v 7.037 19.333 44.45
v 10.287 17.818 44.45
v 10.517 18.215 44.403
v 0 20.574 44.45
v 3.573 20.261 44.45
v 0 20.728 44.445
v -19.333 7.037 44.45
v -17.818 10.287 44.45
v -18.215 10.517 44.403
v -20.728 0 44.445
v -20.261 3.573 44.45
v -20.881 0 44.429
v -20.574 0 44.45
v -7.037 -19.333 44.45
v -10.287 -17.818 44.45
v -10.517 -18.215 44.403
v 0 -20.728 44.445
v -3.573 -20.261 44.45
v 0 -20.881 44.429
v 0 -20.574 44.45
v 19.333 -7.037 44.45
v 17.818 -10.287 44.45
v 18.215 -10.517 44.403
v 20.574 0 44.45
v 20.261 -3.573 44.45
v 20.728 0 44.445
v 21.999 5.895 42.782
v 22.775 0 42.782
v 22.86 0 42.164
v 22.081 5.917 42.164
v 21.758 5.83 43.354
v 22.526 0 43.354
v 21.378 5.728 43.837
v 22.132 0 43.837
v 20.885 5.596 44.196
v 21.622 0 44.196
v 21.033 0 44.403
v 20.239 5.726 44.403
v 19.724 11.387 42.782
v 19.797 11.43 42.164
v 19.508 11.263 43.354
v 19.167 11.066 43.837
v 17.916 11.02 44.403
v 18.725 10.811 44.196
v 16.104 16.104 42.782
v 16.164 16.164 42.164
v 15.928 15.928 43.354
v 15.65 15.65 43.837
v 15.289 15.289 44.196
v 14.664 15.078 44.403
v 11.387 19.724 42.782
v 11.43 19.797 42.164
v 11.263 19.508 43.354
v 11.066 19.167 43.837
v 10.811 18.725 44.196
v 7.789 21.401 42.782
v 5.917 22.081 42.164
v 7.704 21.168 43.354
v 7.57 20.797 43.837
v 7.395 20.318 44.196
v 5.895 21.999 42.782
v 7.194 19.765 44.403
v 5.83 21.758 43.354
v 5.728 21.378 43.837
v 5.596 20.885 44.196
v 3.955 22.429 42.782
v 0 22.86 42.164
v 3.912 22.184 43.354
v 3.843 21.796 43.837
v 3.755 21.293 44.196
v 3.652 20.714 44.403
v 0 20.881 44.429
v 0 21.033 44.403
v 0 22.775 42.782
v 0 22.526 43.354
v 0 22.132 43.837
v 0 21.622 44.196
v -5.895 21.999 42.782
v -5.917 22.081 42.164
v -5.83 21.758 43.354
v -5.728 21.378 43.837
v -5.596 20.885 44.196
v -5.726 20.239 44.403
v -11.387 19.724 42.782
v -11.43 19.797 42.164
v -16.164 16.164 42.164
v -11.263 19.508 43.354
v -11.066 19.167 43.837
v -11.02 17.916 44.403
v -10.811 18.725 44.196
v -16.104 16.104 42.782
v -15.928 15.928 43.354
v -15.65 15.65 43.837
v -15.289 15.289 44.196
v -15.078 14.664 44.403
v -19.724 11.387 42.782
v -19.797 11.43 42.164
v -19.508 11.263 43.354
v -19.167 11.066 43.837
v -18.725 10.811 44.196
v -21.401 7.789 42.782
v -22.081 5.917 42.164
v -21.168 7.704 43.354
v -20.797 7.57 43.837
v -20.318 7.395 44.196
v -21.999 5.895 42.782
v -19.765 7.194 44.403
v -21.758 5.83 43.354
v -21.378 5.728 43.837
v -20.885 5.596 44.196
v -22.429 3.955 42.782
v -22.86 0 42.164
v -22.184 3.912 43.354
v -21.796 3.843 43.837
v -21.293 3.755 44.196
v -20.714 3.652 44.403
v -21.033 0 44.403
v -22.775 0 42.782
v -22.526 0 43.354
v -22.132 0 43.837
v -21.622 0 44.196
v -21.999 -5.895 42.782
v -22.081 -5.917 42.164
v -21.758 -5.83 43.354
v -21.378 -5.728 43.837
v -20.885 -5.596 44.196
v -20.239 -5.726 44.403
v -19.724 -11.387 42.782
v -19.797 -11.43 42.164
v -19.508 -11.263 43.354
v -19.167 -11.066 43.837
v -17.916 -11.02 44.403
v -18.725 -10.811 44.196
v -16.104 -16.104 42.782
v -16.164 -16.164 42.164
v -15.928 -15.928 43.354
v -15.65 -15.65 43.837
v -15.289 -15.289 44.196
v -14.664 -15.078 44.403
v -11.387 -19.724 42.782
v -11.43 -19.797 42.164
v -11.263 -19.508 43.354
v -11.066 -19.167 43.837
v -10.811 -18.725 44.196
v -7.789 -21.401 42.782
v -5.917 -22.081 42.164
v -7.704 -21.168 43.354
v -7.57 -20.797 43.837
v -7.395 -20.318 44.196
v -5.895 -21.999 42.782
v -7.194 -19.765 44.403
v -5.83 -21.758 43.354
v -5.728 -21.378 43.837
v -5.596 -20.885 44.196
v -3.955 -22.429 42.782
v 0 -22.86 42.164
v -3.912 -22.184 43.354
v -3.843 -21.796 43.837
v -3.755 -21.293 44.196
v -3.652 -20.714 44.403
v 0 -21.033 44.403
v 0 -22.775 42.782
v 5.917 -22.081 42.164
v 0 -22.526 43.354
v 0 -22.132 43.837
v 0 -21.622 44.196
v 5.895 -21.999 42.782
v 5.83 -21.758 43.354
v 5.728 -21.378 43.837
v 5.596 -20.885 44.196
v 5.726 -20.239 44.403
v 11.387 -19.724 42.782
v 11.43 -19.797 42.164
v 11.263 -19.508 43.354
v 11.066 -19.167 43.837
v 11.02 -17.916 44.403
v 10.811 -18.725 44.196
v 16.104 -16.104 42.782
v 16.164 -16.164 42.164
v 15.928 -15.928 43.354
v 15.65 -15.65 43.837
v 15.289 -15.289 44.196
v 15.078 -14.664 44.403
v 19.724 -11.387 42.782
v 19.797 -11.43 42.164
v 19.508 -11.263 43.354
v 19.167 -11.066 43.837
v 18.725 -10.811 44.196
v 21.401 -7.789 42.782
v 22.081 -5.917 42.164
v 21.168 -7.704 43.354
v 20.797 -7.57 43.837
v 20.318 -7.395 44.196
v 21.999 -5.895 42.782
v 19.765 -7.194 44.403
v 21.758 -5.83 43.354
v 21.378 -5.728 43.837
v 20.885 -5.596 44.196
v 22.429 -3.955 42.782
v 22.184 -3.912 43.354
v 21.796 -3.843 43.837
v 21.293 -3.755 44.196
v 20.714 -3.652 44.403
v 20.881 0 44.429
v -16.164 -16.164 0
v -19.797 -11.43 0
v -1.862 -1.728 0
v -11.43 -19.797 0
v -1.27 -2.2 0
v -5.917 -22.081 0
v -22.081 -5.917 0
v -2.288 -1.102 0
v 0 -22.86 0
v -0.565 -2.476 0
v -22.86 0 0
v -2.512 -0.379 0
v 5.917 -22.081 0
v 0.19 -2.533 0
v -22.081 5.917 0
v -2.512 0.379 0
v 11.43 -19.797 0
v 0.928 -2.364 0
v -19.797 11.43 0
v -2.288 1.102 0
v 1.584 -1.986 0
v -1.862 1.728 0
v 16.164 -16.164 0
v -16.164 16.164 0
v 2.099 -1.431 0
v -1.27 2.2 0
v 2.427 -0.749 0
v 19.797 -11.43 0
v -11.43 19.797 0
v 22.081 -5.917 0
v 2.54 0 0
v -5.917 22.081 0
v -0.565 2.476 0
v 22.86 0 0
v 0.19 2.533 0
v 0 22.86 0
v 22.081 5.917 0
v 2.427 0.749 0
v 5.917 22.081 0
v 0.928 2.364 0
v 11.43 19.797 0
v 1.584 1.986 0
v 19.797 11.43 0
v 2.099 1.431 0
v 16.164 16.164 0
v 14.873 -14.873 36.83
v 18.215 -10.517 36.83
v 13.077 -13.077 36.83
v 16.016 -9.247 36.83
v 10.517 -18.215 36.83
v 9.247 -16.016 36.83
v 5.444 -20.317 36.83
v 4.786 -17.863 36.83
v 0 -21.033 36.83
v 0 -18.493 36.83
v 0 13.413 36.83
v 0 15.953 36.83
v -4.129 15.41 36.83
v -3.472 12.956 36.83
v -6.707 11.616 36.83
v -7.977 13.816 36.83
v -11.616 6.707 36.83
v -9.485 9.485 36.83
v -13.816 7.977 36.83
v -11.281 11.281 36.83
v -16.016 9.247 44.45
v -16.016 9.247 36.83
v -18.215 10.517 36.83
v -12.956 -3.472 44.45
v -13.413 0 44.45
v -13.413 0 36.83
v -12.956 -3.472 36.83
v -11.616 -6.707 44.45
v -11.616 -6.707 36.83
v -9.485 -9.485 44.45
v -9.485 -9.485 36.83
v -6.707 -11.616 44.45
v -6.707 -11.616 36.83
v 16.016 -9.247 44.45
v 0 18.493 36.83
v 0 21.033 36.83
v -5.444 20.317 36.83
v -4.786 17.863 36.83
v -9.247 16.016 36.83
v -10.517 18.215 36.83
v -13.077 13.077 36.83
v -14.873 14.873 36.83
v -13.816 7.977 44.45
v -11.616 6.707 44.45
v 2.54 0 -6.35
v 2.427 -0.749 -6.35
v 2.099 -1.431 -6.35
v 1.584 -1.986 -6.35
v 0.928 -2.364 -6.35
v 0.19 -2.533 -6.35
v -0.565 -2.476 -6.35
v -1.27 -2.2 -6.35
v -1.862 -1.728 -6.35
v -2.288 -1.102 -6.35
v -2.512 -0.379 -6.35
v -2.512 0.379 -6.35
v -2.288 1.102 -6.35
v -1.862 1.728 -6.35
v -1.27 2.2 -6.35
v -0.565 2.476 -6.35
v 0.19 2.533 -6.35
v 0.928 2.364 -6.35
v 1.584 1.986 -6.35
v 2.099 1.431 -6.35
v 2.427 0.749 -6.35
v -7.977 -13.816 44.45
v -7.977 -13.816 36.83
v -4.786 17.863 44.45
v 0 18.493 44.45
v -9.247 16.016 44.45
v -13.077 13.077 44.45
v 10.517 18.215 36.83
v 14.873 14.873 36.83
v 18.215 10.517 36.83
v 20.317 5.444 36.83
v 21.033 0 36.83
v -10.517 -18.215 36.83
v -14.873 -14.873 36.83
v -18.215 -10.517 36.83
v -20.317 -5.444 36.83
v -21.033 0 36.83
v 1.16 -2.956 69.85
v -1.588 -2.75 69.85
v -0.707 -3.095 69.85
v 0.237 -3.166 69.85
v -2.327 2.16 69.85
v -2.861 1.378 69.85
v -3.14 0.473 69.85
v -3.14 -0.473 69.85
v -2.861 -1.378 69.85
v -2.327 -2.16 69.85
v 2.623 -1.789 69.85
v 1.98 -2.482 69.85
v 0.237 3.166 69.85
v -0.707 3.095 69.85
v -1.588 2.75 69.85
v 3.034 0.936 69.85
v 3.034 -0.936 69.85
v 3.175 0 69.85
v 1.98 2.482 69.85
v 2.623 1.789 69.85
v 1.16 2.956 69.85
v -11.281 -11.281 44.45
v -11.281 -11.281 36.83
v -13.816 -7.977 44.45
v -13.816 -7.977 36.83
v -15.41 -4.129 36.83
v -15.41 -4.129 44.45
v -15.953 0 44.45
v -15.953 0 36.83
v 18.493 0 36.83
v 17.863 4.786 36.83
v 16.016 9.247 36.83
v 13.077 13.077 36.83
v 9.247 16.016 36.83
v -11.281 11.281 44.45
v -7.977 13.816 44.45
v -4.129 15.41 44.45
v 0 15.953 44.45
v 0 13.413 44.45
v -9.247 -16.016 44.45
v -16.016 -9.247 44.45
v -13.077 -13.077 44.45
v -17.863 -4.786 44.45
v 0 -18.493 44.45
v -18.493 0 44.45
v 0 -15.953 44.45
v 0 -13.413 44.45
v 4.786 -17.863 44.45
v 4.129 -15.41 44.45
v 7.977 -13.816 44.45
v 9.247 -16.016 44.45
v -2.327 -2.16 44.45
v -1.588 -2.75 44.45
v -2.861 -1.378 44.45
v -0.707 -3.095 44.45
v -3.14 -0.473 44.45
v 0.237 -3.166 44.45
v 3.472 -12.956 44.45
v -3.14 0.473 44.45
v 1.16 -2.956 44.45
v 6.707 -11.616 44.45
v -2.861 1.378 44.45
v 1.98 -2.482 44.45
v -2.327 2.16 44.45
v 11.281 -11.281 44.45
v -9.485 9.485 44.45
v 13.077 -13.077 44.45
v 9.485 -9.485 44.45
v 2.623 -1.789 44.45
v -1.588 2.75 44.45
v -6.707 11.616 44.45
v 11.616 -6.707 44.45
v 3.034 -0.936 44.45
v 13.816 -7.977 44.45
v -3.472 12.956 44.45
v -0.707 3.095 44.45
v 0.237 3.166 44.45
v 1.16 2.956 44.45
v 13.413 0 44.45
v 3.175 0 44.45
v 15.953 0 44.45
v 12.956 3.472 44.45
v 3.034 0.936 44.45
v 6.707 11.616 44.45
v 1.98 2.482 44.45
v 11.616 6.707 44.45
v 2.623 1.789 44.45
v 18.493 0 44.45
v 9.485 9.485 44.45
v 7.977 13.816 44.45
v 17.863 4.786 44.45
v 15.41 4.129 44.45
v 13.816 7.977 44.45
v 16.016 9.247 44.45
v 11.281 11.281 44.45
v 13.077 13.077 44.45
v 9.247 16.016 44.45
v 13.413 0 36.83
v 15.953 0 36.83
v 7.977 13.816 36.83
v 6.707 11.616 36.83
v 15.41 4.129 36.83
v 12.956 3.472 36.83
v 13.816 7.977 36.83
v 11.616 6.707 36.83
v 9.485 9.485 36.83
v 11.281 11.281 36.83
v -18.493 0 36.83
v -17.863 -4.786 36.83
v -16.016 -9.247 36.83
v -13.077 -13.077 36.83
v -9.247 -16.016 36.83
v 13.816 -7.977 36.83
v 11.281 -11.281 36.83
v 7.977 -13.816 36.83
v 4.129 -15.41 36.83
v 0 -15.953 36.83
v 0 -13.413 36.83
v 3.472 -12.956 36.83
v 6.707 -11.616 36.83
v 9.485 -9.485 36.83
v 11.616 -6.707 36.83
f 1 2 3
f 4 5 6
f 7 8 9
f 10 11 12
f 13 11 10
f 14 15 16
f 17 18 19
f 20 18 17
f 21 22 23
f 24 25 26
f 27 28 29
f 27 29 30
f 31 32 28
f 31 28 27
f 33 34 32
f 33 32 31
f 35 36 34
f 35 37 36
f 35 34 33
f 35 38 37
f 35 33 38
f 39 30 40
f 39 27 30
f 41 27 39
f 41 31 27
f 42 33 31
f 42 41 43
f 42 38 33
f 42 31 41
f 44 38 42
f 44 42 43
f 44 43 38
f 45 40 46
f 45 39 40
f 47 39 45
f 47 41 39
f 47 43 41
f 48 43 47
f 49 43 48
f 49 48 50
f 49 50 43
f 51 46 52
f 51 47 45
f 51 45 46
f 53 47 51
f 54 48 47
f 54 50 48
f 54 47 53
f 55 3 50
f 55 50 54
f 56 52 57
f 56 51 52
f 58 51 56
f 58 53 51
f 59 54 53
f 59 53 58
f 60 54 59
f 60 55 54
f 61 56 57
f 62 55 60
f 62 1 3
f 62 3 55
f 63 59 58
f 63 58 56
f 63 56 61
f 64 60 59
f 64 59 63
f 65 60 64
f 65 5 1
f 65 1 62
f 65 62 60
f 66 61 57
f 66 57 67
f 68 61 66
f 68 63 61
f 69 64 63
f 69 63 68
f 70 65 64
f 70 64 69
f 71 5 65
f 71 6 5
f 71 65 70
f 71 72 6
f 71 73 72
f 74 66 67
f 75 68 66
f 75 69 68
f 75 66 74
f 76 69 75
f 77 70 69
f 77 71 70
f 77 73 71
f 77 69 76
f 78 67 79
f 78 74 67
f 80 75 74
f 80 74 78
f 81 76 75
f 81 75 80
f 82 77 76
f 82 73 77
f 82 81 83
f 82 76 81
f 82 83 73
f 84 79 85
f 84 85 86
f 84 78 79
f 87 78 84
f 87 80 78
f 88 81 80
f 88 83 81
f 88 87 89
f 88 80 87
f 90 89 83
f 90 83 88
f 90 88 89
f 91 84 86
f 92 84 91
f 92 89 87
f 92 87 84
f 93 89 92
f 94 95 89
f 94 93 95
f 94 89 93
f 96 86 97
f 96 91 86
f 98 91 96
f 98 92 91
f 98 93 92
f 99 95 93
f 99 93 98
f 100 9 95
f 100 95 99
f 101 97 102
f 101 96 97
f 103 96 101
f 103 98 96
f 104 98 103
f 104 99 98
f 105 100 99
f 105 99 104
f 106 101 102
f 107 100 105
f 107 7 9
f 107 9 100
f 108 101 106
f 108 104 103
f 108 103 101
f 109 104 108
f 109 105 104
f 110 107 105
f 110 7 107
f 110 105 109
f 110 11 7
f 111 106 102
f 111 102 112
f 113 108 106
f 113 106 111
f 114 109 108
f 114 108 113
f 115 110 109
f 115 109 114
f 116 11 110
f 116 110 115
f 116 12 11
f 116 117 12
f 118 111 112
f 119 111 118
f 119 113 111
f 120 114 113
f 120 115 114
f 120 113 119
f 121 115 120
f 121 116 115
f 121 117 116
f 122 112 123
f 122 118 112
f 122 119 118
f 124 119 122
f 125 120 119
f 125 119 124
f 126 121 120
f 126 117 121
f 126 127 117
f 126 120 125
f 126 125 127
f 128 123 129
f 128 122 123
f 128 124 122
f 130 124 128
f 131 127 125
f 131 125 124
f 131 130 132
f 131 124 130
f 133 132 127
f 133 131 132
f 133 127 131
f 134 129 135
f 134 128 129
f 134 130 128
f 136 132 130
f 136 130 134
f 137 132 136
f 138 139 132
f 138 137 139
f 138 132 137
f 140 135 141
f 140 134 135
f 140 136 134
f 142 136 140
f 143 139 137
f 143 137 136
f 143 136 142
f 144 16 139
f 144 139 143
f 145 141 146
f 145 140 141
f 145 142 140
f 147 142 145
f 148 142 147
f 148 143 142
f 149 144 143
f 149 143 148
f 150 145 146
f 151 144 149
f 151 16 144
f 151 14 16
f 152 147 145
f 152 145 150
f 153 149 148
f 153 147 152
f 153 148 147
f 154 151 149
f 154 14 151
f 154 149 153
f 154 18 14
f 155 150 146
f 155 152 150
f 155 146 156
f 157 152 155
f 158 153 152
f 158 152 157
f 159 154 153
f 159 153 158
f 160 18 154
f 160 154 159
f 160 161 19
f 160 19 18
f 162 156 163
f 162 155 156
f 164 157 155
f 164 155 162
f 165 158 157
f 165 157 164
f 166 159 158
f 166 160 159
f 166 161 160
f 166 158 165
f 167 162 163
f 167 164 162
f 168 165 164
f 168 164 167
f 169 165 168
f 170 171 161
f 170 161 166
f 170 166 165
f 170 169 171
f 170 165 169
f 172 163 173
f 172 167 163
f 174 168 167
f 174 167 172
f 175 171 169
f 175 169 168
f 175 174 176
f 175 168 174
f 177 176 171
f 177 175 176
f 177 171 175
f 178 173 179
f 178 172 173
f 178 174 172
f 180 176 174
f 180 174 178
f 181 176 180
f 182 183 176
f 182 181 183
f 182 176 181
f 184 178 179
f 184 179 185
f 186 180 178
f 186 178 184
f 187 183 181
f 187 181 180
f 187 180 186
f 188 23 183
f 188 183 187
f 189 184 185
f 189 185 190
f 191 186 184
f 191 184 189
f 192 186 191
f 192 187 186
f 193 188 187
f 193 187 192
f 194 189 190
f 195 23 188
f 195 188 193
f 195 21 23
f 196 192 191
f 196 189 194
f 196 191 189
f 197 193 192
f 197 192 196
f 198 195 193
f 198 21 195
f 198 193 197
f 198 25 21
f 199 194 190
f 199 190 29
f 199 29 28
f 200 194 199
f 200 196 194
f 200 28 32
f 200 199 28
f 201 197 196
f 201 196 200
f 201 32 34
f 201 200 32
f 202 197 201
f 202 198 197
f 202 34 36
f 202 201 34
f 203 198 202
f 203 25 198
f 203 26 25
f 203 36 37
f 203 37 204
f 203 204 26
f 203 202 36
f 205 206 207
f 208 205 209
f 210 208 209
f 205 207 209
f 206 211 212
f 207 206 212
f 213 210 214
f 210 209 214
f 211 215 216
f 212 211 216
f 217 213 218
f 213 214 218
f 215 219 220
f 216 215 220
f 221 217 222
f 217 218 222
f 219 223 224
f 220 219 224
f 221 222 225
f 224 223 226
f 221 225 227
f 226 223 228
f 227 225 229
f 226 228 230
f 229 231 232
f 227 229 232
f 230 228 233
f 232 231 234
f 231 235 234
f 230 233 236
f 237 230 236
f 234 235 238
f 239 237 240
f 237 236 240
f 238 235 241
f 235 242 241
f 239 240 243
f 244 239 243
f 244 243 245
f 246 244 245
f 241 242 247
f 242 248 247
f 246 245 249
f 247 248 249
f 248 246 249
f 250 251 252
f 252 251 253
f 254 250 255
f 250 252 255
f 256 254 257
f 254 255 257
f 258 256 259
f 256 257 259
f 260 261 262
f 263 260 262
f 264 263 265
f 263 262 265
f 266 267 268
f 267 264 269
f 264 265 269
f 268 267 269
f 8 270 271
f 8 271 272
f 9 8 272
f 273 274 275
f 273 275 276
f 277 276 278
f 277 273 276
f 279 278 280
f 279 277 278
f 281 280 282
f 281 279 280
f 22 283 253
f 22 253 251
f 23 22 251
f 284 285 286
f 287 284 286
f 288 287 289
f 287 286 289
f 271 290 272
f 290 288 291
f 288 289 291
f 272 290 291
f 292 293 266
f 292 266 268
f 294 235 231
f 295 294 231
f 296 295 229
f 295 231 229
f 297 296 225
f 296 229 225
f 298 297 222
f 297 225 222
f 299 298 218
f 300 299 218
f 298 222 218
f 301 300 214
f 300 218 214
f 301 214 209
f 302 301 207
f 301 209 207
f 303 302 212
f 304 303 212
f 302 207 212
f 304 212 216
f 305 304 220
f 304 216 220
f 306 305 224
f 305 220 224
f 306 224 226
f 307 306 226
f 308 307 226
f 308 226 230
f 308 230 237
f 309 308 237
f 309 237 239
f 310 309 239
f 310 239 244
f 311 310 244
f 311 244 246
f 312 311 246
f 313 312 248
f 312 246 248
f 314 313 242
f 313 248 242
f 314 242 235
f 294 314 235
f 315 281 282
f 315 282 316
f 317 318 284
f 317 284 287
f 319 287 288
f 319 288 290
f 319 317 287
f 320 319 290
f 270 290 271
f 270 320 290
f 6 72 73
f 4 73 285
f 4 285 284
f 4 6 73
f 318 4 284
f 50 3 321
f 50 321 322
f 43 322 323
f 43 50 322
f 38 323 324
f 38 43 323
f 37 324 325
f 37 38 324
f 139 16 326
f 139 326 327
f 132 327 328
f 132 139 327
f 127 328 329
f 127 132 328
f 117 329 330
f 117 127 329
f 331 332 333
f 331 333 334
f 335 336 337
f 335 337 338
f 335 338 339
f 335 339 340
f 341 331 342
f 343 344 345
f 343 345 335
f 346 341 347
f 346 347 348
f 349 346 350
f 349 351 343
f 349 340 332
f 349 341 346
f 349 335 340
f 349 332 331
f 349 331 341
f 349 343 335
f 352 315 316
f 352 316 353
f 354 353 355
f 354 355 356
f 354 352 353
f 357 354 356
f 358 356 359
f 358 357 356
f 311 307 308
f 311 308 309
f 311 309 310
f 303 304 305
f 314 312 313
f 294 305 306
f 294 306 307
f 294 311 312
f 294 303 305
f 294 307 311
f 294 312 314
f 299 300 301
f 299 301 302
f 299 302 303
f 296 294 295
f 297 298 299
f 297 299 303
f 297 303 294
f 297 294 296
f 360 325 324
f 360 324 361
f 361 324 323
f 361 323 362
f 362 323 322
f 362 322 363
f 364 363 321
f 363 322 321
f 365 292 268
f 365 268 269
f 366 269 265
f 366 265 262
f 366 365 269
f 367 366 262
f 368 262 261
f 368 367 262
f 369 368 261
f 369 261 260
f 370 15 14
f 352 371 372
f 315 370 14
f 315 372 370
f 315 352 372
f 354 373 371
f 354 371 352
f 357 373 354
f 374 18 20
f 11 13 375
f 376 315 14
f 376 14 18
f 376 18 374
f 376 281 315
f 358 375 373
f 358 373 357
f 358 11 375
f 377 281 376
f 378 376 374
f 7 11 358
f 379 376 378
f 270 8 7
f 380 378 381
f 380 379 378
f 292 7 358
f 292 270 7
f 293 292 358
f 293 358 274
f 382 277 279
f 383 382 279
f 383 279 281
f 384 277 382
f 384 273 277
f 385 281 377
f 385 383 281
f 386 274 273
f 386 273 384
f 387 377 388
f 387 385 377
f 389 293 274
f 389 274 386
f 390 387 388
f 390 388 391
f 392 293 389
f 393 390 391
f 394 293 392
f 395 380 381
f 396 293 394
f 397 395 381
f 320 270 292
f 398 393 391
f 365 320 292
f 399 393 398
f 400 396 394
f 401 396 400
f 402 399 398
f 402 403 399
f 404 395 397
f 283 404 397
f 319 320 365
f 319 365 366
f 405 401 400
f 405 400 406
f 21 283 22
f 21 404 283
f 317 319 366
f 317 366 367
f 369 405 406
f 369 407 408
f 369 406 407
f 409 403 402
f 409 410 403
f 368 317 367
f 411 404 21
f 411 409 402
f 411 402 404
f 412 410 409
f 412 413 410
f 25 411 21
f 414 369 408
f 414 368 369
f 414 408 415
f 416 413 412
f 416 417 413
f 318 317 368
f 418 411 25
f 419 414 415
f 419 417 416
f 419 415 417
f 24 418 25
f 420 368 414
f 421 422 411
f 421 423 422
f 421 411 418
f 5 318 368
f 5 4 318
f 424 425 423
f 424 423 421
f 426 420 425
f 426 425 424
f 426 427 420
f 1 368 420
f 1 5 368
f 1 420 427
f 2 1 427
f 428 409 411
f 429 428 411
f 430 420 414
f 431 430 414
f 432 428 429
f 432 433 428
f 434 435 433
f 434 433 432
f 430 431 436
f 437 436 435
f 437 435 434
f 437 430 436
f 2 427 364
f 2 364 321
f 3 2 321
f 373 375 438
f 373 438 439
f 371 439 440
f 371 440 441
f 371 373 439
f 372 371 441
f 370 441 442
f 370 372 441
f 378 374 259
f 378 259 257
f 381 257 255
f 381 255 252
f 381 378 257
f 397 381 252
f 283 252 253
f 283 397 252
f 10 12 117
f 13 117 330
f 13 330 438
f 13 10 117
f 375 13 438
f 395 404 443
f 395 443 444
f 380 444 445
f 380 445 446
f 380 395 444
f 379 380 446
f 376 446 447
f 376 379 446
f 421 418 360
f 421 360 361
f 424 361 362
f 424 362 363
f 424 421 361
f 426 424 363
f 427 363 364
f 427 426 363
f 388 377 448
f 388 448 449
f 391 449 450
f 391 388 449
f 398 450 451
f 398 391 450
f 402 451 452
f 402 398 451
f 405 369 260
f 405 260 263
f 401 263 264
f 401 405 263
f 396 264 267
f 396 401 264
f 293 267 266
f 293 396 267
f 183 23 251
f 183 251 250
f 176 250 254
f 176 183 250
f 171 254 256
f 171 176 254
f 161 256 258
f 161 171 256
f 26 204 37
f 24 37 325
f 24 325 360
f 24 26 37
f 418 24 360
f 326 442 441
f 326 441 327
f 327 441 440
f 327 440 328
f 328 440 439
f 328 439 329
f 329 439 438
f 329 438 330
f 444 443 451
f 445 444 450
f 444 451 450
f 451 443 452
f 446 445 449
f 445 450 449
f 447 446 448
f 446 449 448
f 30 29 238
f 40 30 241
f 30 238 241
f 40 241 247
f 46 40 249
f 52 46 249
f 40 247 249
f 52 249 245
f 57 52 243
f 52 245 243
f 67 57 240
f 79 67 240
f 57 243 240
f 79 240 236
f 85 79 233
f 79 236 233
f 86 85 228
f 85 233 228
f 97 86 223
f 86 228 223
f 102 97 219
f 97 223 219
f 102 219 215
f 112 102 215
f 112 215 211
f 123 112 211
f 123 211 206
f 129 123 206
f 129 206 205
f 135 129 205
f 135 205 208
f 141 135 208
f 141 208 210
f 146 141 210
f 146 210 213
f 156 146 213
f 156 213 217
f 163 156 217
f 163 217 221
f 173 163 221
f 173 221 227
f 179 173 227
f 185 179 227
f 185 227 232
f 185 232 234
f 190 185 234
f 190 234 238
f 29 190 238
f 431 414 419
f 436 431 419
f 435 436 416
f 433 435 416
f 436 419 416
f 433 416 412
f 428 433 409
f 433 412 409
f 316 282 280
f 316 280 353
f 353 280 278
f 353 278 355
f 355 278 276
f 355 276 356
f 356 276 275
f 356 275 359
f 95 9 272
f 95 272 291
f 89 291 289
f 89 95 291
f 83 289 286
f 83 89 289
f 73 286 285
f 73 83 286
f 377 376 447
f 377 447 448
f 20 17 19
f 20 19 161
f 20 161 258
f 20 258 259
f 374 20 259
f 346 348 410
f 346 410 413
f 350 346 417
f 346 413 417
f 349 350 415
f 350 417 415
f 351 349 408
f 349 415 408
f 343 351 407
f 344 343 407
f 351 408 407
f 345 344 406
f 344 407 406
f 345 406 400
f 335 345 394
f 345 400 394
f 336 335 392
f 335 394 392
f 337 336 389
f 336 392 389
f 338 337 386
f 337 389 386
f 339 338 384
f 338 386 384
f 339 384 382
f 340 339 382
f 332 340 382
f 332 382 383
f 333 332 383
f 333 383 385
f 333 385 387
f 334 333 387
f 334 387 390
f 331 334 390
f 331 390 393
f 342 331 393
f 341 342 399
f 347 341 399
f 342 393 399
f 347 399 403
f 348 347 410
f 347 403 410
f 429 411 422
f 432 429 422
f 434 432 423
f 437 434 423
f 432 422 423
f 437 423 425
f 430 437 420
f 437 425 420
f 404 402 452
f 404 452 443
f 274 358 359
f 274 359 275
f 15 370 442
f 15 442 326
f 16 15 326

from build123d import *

# Parameters (mm, degrees)
SKETCH1_R           = 22.86
BOSS_EXTRUDE1_DEPTH = 44.45
SKETCH2_R           = 3.175
BOSS_EXTRUDE2_DEPTH = 25.4
CUT_EXTRUDE1_DEPTH  = 7.62
FILLET1_R           = 2.286
SKETCH4_R           = 2.54
BOSS_EXTRUDE3_DEPTH = 6.35


with BuildPart() as part:
    # Sketch1 → Boss-Extrude1 (new body)
    with BuildSketch(Plane.XY):
        Circle(SKETCH1_R)
    extrude(amount=BOSS_EXTRUDE1_DEPTH)

    # Sketch2 → Boss-Extrude2 (add)
    with BuildSketch(Plane.XY.offset(44.45)):
        Circle(SKETCH2_R)
    extrude(amount=BOSS_EXTRUDE2_DEPTH)

    # Sketch3 → Cut-Extrude1 (cut)
    with BuildSketch(Plane.XY.offset(44.45)):
        with BuildLine():
            Line((13.413435382, 0), (15.953435382, 0))
            ThreePointArc((15.953435382, 0), (13.816080318, 7.976717691), (7.976717691, 13.816080318))
            Line((7.976717691, 13.816080318), (6.706717691, 11.616375793))
            ThreePointArc((6.706717691, 11.616375793), (11.616375793, 6.706717691), (13.413435382, 0))
        make_face()
        with BuildLine():
            Line((9.246717691, 16.015784844), (10.516717691, 18.215489369))
            ThreePointArc((10.516717691, 18.215489369), (18.215489369, 10.516717691), (21.033435382, 0))
            Line((21.033435382, 0), (18.493435382, 0))
            ThreePointArc((18.493435382, 0), (16.015784844, 9.246717691), (9.246717691, 16.015784844))
        make_face()
        with BuildLine():
            Line((11.616375793, -6.706717691), (13.816080318, -7.976717691))
            ThreePointArc((13.816080318, -7.976717691), (7.976717691, -13.816080318), (0, -15.953435382))
            Line((0, -15.953435382), (0, -13.413435382))
            ThreePointArc((0, -13.413435382), (6.706717691, -11.616375793), (11.616375793, -6.706717691))
        make_face()
        with BuildLine():
            Line((16.015784844, -9.246717691), (18.215489369, -10.516717691))
            ThreePointArc((18.215489369, -10.516717691), (10.516717691, -18.215489369), (0, -21.033435382))
            Line((0, -21.033435382), (0, -18.493435382))
            ThreePointArc((0, -18.493435382), (9.246717691, -16.015784844), (16.015784844, -9.246717691))
        make_face()
        with BuildLine():
            Line((-6.706717691, -11.616375793), (-7.976717691, -13.816080318))
            ThreePointArc((-7.976717691, -13.816080318), (-13.816080318, -7.976717691), (-15.953435382, 0))
            Line((-15.953435382, 0), (-13.413435382, 0))
            ThreePointArc((-13.413435382, 0), (-11.616375793, -6.706717691), (-6.706717691, -11.616375793))
        make_face()
        with BuildLine():
            Line((-9.246717691, -16.015784844), (-10.516717691, -18.215489369))
            ThreePointArc((-10.516717691, -18.215489369), (-18.215489369, -10.516717691), (-21.033435382, 0))
            Line((-21.033435382, 0), (-18.493435382, 0))
            ThreePointArc((-18.493435382, 0), (-16.015784844, -9.246717691), (-9.246717691, -16.015784844))
        make_face()
        with BuildLine():
            Line((-11.616375793, 6.706717691), (-13.816080318, 7.976717691))
            ThreePointArc((-13.816080318, 7.976717691), (-7.976717691, 13.816080318), (0, 15.953435382))
            Line((0, 15.953435382), (0, 13.413435382))
            ThreePointArc((0, 13.413435382), (-6.706717691, 11.616375793), (-11.616375793, 6.706717691))
        make_face()
        with BuildLine():
            Line((-16.015784844, 9.246717691), (-18.215489369, 10.516717691))
            ThreePointArc((-18.215489369, 10.516717691), (-10.516717691, 18.215489369), (0, 21.033435382))
            Line((0, 21.033435382), (0, 18.493435382))
            ThreePointArc((0, 18.493435382), (-9.246717691, 16.015784844), (-16.015784844, 9.246717691))
        make_face()
    extrude(amount=-CUT_EXTRUDE1_DEPTH, mode=Mode.SUBTRACT)

    # Fillet1
    # the kernel refuses this fillet: 2.286 mm, written as the material it takes off along each edge
    with BuildSketch(Plane(origin=(0, 0, 44.45), x_dir=(1, 0, 0), z_dir=(0, -1, 0))) as fillet1_piece_1:
        with BuildLine():
            CenterArc((22.86 - FILLET1_R, -FILLET1_R), FILLET1_R, 0, 90)
            Line((22.86 - FILLET1_R, 0), (22.86, 0))
            Line((22.86, 0), (22.86, -FILLET1_R))
        make_face()
    revolve(axis=Axis((0, 0, 44.45), (0, 0, 1)), mode=Mode.SUBTRACT)

    # Sketch4 → Boss-Extrude3 (add)
    with BuildSketch(Plane(origin=(0, 0, 0), x_dir=(-1, 0, 0), z_dir=(0, 0, -1))):
        with Locations(Location((0, 0, 0), (0, 0, 180))):
            Circle(SKETCH4_R)
    extrude(amount=BOSS_EXTRUDE3_DEPTH)


solid = part.part
